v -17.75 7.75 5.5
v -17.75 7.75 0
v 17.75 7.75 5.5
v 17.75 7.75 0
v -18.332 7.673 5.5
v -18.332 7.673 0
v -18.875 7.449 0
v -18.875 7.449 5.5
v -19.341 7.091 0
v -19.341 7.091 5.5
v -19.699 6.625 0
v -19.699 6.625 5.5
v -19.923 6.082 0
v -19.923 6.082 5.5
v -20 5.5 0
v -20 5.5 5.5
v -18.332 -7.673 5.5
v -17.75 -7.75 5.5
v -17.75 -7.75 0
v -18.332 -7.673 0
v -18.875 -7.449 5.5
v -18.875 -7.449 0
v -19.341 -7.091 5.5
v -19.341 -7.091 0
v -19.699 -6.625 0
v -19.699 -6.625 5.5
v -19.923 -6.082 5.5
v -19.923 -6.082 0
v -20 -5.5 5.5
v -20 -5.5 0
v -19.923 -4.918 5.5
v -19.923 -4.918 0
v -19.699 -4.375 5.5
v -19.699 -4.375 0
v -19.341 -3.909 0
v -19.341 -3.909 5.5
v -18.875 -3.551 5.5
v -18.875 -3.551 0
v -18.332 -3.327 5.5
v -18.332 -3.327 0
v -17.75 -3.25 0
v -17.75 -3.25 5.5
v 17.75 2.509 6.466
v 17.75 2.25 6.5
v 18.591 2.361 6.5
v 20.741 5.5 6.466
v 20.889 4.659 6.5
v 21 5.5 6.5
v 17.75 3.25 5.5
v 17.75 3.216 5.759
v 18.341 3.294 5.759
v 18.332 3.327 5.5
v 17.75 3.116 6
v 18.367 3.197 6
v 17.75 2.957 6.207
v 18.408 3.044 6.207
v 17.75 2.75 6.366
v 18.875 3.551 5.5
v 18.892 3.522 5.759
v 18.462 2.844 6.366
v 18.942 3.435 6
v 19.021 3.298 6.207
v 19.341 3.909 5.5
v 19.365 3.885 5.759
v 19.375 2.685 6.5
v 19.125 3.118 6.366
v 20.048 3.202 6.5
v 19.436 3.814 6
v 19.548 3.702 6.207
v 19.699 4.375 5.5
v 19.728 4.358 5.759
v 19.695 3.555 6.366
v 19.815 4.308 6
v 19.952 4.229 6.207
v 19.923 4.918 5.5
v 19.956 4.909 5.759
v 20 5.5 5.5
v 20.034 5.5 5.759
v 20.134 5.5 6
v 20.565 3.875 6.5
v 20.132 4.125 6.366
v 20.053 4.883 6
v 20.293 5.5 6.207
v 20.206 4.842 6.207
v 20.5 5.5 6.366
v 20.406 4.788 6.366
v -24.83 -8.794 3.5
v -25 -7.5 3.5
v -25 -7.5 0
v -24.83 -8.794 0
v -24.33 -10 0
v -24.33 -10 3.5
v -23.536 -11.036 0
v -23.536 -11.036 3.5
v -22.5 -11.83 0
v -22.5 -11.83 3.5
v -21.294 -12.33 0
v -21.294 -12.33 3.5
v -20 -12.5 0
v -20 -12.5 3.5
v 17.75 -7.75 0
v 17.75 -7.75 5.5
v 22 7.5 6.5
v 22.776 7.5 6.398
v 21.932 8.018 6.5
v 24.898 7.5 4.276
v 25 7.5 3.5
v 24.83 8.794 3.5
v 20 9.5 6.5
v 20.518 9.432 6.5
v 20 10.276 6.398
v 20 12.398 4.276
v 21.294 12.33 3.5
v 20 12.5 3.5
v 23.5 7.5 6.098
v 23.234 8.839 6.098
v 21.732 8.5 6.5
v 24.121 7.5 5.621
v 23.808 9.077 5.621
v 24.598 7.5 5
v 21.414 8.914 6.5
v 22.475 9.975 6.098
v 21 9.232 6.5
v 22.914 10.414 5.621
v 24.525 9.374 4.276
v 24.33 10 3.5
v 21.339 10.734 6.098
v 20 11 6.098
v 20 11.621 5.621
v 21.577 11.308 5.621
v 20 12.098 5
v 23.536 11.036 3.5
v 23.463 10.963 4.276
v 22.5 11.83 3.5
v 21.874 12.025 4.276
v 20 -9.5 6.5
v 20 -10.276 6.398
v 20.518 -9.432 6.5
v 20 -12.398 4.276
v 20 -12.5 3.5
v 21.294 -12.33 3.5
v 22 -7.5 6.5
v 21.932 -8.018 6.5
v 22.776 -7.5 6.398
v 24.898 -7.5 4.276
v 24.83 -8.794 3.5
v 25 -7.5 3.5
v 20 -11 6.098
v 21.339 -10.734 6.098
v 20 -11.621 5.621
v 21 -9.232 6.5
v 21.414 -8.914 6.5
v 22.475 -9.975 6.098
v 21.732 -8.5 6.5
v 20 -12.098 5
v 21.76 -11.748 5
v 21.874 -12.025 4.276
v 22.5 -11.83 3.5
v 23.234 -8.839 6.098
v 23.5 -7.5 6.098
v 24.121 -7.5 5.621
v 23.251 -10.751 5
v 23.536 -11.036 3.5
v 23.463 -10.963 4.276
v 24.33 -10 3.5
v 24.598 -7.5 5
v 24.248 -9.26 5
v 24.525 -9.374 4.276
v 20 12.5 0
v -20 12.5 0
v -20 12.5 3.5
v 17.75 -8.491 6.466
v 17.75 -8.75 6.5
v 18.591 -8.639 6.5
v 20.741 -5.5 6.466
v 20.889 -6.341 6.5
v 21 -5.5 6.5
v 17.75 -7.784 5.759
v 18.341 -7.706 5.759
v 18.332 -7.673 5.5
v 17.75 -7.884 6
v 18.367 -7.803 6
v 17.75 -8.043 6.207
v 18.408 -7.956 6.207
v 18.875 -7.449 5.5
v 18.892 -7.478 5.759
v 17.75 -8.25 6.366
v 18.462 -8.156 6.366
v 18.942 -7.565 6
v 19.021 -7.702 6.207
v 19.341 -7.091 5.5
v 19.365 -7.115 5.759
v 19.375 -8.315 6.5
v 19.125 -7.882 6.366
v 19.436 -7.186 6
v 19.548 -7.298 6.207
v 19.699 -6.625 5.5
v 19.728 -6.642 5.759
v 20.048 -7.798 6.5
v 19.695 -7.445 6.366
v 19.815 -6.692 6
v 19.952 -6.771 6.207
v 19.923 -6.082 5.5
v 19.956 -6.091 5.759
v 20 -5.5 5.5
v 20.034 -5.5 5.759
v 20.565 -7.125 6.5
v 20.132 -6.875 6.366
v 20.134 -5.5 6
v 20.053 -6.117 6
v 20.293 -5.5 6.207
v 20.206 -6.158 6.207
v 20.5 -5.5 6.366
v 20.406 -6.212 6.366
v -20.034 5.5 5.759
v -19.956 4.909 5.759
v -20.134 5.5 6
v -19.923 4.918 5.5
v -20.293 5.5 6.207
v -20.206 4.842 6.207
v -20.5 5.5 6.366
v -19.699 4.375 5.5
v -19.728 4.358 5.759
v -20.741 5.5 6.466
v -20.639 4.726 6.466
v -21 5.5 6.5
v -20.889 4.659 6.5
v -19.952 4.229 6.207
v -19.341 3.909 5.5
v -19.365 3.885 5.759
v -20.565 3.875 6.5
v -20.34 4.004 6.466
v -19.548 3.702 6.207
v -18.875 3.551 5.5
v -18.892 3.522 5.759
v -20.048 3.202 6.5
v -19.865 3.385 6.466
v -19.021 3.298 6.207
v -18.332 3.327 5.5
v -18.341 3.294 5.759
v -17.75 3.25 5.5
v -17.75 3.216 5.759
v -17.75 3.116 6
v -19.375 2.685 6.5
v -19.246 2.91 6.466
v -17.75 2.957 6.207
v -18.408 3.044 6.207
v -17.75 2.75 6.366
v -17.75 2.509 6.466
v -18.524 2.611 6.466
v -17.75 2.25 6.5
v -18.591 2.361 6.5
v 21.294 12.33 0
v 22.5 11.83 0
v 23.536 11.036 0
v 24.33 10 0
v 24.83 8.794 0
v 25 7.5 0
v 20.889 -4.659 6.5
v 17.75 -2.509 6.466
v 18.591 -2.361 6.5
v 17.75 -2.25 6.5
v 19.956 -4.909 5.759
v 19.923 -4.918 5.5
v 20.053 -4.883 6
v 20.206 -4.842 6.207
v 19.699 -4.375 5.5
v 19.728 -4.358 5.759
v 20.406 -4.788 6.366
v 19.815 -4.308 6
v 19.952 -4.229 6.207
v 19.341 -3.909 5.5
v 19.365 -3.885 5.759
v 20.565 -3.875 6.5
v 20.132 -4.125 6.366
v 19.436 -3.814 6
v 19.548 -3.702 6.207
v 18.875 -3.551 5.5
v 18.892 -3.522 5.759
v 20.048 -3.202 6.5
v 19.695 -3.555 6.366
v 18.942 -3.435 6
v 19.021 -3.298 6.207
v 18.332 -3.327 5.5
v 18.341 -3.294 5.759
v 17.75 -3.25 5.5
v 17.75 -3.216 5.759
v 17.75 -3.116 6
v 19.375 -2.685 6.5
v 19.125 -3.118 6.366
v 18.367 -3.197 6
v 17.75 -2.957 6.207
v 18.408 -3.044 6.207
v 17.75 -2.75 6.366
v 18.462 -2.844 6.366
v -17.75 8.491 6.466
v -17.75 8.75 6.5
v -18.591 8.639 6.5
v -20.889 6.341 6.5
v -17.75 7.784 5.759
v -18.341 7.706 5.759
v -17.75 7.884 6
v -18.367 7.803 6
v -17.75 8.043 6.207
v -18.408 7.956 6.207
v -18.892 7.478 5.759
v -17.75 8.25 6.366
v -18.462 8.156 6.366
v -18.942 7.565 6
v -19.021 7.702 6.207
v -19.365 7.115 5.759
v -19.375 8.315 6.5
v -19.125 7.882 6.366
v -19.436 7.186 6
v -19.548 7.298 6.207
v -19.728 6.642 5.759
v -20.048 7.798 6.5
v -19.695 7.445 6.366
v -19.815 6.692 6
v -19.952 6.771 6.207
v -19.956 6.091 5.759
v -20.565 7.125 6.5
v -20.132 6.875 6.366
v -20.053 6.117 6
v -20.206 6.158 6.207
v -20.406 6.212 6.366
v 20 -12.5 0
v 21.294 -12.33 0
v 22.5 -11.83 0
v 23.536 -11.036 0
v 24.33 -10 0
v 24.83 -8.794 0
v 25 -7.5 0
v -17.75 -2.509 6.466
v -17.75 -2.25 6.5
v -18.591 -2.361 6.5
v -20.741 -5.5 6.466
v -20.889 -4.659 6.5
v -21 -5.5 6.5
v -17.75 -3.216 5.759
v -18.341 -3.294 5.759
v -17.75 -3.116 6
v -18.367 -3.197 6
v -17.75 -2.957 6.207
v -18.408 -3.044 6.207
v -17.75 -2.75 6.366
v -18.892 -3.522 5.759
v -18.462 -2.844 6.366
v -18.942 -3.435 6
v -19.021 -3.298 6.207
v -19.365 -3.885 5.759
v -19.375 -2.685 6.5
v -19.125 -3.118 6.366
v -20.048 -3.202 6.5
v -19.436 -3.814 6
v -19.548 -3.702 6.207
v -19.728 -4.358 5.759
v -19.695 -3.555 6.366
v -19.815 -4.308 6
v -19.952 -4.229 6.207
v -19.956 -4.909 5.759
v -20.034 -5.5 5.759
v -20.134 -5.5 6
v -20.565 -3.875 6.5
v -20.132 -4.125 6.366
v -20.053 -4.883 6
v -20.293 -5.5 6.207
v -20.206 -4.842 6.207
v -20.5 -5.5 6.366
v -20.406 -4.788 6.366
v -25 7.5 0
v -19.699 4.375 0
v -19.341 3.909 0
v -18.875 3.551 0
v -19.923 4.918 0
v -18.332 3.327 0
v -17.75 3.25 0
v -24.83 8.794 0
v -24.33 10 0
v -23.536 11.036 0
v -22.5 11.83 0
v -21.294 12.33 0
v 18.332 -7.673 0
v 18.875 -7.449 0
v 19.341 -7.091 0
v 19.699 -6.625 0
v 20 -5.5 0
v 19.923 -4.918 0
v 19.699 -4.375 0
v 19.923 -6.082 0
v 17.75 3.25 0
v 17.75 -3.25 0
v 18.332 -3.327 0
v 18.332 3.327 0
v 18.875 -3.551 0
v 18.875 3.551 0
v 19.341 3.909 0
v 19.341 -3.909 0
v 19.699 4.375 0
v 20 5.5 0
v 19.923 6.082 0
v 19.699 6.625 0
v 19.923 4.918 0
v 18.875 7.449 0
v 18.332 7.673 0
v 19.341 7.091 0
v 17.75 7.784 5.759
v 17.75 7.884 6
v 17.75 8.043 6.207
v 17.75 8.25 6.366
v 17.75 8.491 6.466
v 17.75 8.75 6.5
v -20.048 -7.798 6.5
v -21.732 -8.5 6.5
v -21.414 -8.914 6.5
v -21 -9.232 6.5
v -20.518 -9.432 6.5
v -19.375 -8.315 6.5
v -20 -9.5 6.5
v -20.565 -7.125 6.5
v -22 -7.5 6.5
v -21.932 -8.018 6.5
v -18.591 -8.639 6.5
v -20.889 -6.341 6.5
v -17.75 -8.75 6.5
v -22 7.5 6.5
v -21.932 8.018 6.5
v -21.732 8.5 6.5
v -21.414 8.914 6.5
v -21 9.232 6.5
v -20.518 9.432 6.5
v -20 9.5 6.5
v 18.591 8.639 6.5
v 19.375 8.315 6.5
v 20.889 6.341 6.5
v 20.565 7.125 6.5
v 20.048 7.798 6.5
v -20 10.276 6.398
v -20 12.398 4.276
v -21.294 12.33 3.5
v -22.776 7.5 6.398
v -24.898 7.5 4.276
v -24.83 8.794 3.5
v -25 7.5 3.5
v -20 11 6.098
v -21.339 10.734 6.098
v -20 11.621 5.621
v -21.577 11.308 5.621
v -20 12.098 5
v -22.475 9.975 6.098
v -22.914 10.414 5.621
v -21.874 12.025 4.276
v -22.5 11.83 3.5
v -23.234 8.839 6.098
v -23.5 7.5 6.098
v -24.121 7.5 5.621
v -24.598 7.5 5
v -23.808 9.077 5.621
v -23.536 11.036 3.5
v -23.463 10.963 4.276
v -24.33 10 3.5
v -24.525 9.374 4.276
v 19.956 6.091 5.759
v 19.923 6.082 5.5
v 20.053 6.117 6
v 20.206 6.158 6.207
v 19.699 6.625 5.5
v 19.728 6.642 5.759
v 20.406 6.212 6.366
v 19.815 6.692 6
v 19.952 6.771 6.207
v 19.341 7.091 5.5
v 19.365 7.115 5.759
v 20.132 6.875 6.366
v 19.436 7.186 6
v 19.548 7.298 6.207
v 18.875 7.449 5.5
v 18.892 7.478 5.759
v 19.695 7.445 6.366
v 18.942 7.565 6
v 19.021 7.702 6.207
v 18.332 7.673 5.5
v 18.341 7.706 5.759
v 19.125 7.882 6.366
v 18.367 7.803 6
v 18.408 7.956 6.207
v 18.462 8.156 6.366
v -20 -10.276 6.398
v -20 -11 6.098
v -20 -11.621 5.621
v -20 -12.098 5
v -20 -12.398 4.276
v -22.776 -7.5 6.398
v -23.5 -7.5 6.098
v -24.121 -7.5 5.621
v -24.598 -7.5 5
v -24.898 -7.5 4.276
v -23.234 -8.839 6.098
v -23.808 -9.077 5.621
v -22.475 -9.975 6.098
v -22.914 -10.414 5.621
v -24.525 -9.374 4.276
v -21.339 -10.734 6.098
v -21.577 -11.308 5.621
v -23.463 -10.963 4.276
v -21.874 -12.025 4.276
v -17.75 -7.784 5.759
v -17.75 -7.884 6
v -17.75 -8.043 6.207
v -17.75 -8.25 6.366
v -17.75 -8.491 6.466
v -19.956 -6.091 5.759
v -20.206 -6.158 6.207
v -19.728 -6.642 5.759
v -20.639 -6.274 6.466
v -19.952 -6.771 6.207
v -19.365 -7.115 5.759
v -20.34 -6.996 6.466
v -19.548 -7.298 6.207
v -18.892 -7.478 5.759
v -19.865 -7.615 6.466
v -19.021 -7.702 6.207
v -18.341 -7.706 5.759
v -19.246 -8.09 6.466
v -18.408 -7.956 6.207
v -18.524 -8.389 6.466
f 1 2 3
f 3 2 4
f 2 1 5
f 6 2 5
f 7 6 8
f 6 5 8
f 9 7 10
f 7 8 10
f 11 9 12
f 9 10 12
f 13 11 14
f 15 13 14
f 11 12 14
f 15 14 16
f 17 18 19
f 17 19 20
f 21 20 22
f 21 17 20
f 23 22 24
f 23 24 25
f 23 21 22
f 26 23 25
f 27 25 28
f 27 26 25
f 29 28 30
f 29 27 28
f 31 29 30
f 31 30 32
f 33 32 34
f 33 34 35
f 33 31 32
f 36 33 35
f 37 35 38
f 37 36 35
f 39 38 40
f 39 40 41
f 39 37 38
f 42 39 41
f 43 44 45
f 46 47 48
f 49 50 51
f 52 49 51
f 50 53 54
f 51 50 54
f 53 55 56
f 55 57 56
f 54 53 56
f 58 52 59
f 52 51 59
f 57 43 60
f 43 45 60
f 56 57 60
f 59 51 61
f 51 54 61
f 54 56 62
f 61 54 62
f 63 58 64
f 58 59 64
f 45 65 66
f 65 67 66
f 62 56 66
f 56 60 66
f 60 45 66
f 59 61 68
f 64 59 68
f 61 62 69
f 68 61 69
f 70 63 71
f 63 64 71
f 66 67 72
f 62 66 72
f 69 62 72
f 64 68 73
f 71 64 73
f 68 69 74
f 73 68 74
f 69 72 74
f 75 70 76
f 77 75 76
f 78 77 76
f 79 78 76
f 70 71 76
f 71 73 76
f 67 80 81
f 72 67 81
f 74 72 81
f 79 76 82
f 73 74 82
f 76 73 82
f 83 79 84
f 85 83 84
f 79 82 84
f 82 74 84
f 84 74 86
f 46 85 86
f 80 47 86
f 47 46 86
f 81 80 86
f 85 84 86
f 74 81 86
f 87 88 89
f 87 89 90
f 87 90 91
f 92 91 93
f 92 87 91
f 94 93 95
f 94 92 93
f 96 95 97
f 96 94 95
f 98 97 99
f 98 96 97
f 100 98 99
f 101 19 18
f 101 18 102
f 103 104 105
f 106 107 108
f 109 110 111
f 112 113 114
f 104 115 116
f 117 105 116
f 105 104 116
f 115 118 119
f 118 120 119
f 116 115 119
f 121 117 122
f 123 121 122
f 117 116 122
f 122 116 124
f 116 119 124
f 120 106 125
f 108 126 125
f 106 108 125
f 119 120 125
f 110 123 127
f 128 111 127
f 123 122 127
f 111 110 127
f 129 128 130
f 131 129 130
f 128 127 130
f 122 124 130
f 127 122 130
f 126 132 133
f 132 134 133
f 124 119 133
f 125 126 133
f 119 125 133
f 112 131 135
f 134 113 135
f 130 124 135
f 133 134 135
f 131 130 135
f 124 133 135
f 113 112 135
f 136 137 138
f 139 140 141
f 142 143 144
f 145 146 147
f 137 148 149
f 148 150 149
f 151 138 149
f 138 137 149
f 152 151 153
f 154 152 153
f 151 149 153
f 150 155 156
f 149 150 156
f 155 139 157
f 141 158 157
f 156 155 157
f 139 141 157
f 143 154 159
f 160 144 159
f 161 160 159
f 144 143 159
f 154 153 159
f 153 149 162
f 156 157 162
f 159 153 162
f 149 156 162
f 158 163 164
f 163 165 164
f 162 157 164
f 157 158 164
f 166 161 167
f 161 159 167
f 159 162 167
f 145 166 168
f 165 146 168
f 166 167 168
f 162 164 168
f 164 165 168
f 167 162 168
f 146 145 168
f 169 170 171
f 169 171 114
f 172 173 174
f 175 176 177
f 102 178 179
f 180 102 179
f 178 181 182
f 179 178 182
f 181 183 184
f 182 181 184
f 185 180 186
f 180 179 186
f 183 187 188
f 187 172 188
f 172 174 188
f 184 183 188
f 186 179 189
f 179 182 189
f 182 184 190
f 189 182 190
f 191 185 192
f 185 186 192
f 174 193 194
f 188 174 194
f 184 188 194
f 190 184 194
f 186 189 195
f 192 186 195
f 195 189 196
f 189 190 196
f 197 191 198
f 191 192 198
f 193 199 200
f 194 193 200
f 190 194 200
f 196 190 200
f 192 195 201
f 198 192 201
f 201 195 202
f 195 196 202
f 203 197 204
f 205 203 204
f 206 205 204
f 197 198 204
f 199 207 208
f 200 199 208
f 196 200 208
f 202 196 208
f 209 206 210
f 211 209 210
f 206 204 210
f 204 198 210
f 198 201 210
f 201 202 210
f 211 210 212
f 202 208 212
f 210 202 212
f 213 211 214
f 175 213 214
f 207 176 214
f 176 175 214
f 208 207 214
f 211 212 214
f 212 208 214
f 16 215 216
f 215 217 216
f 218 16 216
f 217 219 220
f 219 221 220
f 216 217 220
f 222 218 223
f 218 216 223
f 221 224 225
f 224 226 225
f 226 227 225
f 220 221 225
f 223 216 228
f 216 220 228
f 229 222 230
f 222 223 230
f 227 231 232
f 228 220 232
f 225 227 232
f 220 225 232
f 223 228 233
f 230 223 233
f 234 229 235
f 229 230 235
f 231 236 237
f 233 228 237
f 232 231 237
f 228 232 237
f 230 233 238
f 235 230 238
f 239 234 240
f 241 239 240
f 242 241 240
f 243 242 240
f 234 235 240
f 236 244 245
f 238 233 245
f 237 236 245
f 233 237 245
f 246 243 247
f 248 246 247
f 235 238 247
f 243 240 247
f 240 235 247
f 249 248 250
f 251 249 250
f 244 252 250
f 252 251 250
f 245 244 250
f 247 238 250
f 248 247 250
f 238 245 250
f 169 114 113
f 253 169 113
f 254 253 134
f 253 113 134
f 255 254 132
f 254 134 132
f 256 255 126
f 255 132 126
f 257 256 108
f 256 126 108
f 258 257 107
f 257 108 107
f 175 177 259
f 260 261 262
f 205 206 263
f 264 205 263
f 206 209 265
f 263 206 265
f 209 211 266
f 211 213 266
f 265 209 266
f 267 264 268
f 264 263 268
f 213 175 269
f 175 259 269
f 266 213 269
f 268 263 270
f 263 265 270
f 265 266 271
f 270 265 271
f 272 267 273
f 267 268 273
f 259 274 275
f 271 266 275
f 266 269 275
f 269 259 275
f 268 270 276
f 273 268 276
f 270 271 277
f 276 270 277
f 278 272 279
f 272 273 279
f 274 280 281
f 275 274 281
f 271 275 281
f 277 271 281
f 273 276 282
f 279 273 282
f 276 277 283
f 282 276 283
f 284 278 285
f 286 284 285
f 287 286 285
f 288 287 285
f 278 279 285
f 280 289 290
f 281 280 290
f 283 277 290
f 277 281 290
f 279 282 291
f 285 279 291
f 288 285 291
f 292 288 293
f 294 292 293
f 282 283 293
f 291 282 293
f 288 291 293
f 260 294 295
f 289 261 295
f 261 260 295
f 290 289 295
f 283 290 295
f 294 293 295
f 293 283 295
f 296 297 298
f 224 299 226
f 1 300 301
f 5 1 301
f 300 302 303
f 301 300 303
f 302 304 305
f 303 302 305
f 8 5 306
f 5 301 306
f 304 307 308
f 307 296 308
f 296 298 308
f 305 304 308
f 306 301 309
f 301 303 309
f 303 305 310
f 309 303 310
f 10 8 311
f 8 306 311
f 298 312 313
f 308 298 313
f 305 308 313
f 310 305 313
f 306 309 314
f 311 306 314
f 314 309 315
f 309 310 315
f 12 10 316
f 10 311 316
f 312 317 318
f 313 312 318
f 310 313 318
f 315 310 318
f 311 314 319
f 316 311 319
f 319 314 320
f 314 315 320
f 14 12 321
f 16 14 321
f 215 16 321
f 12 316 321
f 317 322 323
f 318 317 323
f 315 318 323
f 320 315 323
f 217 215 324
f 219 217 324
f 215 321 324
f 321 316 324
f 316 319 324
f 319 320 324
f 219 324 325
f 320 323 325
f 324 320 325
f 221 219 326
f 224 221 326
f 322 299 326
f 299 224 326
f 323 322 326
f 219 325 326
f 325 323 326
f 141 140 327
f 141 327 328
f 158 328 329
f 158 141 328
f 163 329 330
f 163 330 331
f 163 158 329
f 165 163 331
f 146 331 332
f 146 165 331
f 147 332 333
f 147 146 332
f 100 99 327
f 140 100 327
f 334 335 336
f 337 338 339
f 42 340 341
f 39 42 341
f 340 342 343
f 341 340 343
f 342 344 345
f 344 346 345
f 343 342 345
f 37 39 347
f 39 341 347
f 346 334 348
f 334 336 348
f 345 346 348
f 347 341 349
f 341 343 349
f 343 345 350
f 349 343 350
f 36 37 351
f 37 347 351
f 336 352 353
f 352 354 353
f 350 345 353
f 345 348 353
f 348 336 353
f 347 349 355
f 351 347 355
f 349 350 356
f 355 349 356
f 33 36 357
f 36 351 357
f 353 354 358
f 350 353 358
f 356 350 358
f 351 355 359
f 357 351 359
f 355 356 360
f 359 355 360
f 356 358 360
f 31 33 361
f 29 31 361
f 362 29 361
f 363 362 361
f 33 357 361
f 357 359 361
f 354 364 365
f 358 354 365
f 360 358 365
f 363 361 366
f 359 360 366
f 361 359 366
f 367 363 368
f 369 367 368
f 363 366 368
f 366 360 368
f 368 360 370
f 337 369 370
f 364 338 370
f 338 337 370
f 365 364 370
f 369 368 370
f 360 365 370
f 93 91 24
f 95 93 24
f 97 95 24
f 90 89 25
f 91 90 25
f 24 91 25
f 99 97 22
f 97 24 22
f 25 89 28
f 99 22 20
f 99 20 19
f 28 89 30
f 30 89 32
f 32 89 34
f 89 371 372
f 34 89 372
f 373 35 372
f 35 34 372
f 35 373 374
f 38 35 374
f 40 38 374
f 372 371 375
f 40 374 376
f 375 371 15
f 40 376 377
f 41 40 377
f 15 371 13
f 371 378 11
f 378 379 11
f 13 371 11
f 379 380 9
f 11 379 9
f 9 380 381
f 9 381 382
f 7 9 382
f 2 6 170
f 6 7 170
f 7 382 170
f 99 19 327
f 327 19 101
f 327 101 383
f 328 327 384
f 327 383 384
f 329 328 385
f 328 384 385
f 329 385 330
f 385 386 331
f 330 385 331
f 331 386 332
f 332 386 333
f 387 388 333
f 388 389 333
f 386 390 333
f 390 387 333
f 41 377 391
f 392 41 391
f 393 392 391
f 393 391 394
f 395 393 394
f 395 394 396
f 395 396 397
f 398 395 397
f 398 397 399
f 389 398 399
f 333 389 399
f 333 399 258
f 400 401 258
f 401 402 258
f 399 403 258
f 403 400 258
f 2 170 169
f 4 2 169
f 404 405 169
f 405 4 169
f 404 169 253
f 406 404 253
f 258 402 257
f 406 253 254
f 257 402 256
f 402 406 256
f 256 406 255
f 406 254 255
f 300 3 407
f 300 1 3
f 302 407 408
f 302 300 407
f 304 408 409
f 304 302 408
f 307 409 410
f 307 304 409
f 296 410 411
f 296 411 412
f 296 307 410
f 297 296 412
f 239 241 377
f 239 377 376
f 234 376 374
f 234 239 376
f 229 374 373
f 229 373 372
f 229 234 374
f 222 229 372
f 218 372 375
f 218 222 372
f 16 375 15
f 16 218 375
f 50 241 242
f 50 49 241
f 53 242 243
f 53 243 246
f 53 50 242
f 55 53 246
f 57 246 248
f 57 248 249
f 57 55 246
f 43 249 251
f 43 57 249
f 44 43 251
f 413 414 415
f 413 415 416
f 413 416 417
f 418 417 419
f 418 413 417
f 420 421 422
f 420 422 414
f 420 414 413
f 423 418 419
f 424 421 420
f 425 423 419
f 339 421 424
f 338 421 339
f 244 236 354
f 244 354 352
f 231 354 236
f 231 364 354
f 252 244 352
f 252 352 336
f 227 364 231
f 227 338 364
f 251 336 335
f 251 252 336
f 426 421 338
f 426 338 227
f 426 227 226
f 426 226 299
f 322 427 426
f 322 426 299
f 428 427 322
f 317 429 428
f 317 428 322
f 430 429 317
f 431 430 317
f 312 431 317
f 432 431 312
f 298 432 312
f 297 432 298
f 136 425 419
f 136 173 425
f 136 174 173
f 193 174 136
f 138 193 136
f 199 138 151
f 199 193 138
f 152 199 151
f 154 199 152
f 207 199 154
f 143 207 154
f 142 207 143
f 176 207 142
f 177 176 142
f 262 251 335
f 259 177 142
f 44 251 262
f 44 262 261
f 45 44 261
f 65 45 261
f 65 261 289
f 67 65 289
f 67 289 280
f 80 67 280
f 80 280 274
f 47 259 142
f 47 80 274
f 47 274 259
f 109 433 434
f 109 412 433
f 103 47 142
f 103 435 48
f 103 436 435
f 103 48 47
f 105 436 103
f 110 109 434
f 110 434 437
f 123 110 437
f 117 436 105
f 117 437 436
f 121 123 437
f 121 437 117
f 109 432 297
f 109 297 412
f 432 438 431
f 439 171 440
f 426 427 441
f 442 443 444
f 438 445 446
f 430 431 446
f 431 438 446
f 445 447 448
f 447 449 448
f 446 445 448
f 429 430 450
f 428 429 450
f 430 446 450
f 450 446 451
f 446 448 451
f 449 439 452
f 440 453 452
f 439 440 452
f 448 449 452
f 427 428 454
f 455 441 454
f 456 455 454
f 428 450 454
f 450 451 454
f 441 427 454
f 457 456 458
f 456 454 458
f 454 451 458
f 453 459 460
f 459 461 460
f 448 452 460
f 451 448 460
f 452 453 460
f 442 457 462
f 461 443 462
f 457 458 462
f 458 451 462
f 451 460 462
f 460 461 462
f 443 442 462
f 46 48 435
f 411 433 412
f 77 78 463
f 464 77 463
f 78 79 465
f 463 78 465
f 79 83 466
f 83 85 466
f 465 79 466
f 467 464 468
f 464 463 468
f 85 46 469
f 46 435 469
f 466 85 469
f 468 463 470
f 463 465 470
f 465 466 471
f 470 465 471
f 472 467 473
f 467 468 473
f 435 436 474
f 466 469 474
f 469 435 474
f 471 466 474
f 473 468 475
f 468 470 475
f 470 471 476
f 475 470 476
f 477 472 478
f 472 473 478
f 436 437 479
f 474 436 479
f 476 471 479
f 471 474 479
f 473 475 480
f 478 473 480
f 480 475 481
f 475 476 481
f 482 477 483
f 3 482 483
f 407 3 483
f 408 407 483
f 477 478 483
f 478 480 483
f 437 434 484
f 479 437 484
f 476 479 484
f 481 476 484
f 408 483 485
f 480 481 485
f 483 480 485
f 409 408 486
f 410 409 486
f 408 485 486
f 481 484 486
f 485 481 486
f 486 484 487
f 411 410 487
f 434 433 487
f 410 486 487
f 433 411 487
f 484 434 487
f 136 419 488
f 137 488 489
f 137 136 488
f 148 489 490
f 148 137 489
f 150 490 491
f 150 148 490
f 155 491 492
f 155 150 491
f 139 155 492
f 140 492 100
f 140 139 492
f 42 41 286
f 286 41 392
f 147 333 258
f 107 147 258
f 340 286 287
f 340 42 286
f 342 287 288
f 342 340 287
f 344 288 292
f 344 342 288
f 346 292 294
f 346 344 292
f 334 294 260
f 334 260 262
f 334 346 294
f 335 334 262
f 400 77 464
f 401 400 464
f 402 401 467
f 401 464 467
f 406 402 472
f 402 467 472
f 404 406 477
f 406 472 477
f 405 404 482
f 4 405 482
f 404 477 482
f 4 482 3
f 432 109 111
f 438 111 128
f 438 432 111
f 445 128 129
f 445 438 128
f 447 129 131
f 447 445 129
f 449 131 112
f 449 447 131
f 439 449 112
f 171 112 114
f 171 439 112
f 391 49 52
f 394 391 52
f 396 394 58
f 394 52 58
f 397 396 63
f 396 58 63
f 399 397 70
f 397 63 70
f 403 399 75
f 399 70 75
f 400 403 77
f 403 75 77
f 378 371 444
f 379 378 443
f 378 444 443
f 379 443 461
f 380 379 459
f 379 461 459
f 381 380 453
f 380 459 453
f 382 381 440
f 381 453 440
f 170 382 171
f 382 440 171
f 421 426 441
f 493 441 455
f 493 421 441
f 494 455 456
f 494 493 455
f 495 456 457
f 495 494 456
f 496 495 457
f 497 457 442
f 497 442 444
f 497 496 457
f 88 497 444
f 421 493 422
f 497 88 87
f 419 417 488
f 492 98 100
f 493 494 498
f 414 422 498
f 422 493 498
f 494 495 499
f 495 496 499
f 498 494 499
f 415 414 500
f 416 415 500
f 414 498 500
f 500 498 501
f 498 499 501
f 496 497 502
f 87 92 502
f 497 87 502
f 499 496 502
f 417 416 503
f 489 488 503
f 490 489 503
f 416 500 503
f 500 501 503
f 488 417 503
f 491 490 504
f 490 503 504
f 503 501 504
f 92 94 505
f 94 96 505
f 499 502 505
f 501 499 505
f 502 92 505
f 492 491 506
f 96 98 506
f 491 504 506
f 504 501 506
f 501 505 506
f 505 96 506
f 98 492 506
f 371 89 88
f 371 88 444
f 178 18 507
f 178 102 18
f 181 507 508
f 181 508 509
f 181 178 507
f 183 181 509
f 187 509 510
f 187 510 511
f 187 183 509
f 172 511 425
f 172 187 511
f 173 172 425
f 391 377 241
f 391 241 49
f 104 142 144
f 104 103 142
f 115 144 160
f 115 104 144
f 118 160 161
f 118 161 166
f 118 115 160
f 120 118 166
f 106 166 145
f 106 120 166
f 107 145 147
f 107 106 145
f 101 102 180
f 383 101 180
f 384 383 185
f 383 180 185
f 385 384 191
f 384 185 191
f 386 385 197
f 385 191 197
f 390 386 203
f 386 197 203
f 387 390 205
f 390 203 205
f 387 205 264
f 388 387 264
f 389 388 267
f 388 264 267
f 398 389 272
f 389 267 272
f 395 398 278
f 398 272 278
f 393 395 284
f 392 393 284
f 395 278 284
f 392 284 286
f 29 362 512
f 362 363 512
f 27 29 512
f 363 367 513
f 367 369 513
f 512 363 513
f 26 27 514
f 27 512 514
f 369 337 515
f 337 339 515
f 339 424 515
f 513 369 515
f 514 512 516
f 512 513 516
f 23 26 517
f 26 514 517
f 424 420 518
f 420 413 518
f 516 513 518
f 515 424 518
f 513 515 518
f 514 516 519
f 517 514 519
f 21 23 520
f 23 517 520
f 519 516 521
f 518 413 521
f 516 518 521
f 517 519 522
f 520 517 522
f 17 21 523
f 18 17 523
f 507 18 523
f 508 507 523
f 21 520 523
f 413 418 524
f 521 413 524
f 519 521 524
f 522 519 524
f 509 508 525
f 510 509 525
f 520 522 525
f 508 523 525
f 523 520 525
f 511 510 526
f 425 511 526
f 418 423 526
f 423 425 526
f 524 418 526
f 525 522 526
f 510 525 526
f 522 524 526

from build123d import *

# Parameters (mm, degrees)
F0_W     = 50
F0_H     = 25
F0_W_2   = 40
F0_H_2   = 4.5
F1_DEPTH = 6.5
F2_R     = 5
F3_R     = 2.24999
F4_R     = 1
F5_R     = 3


# Not quite as in the source:
# - a fillet or chamfer is up to 0.001 mm smaller than in the source, because OpenCascade refuses the exact size


with BuildPart() as f1:
    # F0 (on Top) → F1 (new body)
    with BuildSketch(Plane.XY):
        Rectangle(F0_W, F0_H)
        with Locations((0, -5.5)):
            Rectangle(F0_W_2, F0_H_2, mode=Mode.SUBTRACT)
        with Locations((0, 5.5)):
            Rectangle(F0_W_2, F0_H_2, mode=Mode.SUBTRACT)
    extrude(amount=F1_DEPTH)

    # F2
    f2_edges = [f1.edges().sort_by_distance(p)[0] for p in [
        (-25, -12.5, 3.25),
        (25, -12.5, 3.25),
        (25, 12.5, 3.25),
        (-25, 12.5, 3.25),
    ]]
    fillet(f2_edges, radius=F2_R)

    # F3 (radius 2.25 in the source; OpenCascade refuses exactly that, so slightly less here)
    f3_edges = [f1.edges().sort_by_distance(p)[0] for p in [
        (-20, -3.25, 3.25),
        (-20, -7.75, 3.25),
        (-20, 3.25, 3.25),
        (-20, 7.75, 3.25),
        (20, -7.75, 3.25),
        (20, -3.25, 3.25),
        (20, 3.25, 3.25),
        (20, 7.75, 3.25),
    ]]
    fillet(f3_edges, radius=F3_R)

    # F4
    f4_edges = [f1.edges().sort_by_distance(p)[0] for p in [
        (0, -7.75, 6.5),
        (0, 3.25, 6.5),
    ]]
    fillet(f4_edges, radius=F4_R)

    # F5
    f5_edges = [f1.edges().sort_by_distance(p)[0] for p in [
        (25, 0, 6.5),
    ]]
    fillet(f5_edges, radius=F5_R)


solid = f1.part
